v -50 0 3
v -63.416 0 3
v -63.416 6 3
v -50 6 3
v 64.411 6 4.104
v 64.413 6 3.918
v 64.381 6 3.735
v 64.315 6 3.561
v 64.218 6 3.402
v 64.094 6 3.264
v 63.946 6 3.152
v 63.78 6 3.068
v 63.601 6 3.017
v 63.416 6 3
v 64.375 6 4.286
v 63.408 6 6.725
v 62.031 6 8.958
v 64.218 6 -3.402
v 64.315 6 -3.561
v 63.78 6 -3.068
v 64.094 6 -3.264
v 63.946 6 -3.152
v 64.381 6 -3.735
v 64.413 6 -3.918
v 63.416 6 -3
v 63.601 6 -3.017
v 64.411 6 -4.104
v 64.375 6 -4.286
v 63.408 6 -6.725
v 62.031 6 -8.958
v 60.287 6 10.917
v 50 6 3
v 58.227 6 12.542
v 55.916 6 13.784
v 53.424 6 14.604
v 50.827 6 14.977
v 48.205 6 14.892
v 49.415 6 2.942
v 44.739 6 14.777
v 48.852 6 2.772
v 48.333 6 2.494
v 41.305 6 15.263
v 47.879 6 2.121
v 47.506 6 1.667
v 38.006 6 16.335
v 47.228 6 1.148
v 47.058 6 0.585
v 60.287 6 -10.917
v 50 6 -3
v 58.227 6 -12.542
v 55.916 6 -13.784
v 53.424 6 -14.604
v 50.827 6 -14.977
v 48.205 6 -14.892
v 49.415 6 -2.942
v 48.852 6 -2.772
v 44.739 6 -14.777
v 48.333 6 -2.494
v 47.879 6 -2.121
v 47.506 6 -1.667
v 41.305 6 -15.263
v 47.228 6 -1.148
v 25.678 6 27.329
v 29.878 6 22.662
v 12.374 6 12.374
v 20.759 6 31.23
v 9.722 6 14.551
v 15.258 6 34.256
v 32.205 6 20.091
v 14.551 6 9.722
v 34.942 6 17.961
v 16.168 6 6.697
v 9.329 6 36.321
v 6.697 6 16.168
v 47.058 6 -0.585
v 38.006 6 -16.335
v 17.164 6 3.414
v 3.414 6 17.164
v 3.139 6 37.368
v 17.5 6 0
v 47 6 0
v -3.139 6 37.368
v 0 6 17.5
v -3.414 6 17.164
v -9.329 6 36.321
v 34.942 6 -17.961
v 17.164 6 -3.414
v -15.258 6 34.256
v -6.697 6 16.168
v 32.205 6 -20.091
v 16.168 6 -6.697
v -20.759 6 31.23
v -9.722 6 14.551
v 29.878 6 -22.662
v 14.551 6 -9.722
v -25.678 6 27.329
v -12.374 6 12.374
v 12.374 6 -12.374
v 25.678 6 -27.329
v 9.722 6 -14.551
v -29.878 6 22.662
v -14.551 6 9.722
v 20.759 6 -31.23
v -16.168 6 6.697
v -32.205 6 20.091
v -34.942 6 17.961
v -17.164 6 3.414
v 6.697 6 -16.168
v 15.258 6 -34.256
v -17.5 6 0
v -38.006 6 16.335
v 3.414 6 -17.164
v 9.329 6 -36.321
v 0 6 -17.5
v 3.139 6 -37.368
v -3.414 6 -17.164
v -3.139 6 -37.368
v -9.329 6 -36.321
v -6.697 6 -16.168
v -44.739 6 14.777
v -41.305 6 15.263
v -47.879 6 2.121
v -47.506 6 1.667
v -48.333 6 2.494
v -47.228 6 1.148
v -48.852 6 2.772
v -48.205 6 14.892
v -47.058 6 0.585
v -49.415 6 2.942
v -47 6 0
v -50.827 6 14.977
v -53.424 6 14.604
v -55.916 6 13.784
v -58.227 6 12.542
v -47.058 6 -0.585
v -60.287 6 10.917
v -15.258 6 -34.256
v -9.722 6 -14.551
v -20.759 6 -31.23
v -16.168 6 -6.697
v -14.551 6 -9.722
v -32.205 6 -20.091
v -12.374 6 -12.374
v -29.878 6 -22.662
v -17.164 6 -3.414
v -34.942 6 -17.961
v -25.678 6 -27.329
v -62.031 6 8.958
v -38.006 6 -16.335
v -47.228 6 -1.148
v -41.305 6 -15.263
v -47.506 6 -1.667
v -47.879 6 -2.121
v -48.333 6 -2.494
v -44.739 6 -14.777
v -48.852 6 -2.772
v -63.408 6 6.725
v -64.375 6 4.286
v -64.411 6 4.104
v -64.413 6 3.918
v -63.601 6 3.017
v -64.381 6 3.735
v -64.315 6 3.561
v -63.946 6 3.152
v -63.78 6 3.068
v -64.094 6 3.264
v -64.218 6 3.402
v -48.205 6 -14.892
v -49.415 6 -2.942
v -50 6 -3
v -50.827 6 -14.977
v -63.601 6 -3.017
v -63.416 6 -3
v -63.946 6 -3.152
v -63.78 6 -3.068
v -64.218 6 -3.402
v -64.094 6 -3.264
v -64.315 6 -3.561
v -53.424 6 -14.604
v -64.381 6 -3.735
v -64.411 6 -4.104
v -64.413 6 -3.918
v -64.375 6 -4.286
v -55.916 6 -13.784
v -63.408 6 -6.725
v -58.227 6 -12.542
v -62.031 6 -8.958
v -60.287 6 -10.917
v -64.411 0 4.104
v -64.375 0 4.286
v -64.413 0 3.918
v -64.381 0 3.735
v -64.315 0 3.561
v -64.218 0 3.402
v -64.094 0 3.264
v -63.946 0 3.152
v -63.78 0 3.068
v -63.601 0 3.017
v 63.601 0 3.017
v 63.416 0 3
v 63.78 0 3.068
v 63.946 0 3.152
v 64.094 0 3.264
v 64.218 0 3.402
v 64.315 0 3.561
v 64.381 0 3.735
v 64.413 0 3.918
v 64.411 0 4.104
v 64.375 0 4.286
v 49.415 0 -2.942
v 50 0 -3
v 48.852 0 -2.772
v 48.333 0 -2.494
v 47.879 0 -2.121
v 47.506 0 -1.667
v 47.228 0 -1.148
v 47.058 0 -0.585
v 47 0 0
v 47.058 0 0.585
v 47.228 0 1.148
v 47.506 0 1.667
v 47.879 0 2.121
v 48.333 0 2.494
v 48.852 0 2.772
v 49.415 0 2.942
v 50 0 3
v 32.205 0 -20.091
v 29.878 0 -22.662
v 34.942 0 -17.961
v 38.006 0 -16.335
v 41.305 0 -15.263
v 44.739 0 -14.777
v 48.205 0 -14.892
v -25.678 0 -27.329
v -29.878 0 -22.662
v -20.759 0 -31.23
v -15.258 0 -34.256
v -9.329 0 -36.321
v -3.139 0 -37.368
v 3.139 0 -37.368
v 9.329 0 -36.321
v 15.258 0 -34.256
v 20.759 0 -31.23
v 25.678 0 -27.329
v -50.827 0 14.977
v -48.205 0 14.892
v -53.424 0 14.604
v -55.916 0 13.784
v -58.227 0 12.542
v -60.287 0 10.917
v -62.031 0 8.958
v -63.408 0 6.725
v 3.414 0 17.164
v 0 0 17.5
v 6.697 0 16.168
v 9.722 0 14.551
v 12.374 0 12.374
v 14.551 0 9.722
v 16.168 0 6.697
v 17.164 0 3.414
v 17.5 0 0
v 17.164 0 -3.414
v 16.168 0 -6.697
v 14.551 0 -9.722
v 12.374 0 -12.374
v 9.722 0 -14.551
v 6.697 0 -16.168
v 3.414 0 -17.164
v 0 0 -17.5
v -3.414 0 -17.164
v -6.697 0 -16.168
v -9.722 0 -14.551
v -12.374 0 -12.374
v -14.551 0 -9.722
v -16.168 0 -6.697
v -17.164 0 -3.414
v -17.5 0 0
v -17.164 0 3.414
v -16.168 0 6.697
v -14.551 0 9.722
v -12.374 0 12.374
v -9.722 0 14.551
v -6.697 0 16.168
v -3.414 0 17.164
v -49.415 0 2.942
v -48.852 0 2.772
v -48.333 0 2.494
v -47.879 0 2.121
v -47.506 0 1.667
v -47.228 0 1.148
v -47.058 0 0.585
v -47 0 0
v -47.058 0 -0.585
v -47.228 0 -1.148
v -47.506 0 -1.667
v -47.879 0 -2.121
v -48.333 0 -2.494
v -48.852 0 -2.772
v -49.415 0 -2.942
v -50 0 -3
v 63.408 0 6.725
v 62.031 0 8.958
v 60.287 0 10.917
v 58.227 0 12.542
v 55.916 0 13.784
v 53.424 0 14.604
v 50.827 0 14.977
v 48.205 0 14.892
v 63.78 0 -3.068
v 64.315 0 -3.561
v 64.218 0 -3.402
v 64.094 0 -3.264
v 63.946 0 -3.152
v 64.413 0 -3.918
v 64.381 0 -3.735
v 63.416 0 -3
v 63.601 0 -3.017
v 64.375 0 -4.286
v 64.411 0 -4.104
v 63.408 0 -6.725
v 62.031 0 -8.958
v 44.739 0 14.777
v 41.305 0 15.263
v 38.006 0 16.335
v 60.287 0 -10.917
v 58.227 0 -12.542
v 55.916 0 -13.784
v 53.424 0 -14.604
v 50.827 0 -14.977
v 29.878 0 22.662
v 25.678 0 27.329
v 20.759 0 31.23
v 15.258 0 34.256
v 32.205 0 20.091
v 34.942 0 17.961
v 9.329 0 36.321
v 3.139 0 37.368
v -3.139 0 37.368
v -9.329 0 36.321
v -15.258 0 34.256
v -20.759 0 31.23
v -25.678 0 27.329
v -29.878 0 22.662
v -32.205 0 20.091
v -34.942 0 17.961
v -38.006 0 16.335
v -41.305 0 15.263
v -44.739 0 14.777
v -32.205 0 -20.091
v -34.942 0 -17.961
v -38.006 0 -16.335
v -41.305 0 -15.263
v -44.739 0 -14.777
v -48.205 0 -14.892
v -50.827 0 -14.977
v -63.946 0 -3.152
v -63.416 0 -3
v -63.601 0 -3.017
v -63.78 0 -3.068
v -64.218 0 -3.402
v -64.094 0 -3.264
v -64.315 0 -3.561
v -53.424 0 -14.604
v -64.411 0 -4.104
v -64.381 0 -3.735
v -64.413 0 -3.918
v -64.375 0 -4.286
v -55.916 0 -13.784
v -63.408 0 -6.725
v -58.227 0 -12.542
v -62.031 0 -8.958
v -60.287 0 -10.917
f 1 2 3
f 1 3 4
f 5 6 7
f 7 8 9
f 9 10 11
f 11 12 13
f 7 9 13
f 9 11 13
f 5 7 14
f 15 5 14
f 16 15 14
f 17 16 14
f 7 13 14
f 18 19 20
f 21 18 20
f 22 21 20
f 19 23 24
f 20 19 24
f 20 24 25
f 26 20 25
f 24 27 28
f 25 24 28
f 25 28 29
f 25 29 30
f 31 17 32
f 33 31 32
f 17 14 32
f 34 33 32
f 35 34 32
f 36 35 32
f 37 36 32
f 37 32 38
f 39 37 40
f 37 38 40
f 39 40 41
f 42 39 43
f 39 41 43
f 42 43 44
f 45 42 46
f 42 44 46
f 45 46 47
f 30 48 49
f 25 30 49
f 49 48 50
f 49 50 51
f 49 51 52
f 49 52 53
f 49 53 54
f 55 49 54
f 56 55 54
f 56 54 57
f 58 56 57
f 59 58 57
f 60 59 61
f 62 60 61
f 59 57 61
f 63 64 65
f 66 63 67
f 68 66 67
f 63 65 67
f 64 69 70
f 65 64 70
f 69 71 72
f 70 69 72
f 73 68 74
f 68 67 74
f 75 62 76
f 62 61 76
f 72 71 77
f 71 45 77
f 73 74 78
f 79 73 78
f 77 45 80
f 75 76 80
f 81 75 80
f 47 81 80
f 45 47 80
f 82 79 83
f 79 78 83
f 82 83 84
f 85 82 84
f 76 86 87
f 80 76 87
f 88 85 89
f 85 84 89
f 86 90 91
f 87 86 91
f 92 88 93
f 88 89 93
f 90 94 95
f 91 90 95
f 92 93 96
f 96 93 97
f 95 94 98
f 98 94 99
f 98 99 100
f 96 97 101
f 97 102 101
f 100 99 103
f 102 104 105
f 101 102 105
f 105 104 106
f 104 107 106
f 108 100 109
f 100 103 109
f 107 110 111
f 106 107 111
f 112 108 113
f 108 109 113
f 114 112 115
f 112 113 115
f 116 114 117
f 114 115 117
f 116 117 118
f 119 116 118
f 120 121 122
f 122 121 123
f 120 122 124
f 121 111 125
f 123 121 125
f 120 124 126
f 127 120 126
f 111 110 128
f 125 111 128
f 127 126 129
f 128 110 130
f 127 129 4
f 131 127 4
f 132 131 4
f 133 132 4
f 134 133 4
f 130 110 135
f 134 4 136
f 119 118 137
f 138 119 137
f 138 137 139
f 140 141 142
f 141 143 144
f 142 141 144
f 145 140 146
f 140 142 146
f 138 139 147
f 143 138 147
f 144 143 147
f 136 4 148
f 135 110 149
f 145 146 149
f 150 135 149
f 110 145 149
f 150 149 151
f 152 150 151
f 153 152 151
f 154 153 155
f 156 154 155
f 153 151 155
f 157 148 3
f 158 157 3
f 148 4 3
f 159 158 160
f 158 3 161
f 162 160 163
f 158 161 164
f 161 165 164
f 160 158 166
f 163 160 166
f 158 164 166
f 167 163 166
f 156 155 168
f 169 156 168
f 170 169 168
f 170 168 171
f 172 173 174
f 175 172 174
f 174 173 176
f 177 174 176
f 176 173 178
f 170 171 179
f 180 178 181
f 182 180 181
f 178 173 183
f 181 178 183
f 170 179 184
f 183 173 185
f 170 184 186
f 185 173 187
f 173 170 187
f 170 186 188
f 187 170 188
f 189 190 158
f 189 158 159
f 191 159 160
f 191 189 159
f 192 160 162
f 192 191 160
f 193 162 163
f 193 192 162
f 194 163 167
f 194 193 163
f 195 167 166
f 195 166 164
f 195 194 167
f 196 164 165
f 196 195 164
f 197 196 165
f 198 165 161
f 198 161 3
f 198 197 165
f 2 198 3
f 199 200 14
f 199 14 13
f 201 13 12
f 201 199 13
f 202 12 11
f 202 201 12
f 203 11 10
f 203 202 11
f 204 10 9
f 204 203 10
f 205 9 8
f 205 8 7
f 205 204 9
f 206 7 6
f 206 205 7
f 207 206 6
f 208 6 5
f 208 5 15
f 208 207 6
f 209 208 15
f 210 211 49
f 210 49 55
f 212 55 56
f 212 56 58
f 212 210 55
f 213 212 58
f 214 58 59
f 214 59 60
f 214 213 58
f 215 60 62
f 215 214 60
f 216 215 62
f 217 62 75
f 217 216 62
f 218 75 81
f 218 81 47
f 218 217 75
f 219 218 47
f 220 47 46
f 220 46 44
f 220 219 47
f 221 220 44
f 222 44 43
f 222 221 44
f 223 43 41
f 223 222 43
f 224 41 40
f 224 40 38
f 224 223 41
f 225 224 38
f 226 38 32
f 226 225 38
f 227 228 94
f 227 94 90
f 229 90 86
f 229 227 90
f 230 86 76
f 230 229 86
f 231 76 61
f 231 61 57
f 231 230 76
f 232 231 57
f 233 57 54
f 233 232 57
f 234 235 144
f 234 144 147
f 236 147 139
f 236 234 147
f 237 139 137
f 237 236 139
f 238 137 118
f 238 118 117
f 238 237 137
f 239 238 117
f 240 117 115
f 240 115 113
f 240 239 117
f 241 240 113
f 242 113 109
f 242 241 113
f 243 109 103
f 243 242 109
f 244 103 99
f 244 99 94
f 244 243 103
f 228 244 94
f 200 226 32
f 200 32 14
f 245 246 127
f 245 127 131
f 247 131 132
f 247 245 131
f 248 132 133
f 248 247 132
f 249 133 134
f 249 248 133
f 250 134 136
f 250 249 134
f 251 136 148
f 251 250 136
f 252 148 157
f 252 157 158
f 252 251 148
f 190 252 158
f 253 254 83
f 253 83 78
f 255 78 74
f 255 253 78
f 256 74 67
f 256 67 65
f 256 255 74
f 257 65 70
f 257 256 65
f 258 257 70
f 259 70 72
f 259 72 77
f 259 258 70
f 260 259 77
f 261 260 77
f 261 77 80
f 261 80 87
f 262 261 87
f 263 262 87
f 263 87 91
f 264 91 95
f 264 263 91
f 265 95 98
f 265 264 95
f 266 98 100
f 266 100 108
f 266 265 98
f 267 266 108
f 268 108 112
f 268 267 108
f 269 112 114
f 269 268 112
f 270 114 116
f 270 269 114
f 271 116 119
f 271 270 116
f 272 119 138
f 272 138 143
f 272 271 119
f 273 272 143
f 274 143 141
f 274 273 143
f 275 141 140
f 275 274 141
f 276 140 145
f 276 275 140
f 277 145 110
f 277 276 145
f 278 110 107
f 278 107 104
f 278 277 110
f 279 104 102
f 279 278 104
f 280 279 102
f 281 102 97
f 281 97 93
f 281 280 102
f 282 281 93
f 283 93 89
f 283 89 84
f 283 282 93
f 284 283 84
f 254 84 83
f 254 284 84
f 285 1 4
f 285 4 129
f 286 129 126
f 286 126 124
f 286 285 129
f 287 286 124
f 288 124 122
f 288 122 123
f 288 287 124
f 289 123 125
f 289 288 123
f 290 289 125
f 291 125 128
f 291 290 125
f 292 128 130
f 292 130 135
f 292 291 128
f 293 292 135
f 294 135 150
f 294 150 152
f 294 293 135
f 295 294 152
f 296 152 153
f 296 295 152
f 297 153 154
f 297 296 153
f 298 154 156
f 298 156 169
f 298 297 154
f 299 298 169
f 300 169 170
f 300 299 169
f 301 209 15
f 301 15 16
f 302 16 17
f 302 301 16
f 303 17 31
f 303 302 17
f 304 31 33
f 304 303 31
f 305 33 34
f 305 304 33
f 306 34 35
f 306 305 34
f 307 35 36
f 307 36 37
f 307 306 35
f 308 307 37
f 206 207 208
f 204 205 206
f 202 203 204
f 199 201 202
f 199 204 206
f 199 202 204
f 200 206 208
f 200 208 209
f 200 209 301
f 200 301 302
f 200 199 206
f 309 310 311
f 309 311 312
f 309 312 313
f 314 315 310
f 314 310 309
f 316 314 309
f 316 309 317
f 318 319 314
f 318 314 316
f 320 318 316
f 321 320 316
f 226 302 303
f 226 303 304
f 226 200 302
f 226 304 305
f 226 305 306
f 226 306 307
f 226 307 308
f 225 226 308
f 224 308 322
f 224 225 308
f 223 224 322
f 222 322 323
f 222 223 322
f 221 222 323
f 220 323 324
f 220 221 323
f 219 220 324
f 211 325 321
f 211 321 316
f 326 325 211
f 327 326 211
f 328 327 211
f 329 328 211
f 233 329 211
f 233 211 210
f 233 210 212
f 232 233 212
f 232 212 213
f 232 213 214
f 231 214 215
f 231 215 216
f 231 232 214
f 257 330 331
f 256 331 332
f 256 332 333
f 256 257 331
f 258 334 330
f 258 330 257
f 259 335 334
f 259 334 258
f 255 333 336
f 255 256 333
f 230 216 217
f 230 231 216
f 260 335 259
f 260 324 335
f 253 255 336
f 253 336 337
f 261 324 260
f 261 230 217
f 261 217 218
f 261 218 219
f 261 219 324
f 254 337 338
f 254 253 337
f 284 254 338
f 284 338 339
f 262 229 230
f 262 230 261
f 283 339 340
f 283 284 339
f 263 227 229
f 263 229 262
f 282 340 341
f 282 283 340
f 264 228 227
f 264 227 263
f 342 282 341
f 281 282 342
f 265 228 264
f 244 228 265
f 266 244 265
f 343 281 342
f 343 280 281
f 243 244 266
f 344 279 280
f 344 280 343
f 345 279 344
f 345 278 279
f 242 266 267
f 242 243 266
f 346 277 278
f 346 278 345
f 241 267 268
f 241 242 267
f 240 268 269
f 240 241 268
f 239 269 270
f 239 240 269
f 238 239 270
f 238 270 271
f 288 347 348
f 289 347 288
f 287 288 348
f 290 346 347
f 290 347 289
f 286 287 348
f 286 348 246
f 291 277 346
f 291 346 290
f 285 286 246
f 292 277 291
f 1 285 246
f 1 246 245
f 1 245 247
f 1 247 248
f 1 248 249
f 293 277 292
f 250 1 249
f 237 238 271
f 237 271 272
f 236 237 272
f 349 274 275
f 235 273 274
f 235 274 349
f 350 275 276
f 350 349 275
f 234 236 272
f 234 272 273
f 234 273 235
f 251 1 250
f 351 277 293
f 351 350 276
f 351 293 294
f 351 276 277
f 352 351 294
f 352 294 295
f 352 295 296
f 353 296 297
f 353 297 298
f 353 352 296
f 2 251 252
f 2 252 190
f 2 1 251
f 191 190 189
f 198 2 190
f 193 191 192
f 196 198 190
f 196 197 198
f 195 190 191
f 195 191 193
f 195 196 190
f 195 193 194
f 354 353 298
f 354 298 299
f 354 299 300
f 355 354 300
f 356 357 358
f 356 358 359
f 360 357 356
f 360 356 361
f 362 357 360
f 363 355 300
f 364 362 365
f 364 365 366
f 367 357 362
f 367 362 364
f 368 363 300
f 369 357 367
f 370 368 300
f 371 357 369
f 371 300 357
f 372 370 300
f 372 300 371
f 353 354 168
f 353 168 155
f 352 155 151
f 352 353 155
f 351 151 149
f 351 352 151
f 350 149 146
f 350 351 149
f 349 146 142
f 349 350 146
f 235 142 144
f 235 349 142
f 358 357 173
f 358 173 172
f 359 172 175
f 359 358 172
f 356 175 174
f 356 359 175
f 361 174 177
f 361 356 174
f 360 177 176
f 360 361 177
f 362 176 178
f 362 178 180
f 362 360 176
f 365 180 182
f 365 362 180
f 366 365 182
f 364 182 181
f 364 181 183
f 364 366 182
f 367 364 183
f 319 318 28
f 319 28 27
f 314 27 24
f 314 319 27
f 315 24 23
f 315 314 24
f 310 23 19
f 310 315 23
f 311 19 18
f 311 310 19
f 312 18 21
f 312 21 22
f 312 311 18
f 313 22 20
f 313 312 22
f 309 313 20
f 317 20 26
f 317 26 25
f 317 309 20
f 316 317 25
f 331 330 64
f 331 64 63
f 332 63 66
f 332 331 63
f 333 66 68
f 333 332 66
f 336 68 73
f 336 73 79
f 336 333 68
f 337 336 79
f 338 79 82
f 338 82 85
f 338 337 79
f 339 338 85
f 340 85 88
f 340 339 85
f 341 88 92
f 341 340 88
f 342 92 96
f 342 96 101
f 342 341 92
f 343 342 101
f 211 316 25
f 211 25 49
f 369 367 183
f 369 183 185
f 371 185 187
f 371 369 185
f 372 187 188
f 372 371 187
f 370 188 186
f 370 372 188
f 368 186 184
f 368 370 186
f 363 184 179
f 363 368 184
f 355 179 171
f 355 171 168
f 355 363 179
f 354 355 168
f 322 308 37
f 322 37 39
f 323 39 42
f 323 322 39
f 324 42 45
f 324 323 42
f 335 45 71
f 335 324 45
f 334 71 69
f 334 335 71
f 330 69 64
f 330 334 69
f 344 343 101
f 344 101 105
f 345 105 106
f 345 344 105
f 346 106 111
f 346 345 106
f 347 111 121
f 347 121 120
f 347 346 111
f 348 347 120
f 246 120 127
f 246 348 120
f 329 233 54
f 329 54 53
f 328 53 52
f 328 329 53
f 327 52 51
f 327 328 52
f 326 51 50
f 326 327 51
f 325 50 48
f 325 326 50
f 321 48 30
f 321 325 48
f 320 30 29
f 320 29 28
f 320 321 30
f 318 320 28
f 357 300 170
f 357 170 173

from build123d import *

# Parameters (mm, degrees)
SKETCH1_R           = 17.5
BOSS_EXTRUDE1_DEPTH = 6


with BuildPart() as part:
    # Sketch1 → Boss-Extrude1 (new body)
    with BuildSketch(Plane(origin=(0, 0, 0), x_dir=(1, 0, 0), z_dir=(0, 1, 0))):
        with BuildLine():
            Line((50, -3), (63.416407865, -3))
            ThreePointArc((63.416407865, -3), (64.218191591, -3.402385695), (64.374722712, -4.285714286))
            ThreePointArc((64.374722712, -4.285714286), (58.227349417, -12.542357098), (48.205357143, -14.892254934))
            ThreePointArc((48.205357143, -14.892254934), (38.006177908, -16.334976641), (29.877717391, -22.662127073))
            ThreePointArc((29.877717391, -22.662127073), (0, -37.5), (-29.877717391, -22.662127073))
            ThreePointArc((-29.877717391, -22.662127073), (-38.006177908, -16.334976641), (-48.205357143, -14.892254934))
            ThreePointArc((-48.205357143, -14.892254934), (-58.227349417, -12.542357098), (-64.374722712, -4.285714286))
            ThreePointArc((-64.374722712, -4.285714286), (-64.218191591, -3.402385695), (-63.416407865, -3))
            Line((-63.416407865, -3), (-50, -3))
            ThreePointArc((-50, -3), (-47, 0), (-50, 3))
            Line((-50, 3), (-63.416407865, 3))
            ThreePointArc((-63.416407865, 3), (-64.218191591, 3.402385695), (-64.374722712, 4.285714286))
            ThreePointArc((-64.374722712, 4.285714286), (-58.227349417, 12.542357098), (-48.205357143, 14.892254934))
            ThreePointArc((-48.205357143, 14.892254934), (-38.006177908, 16.334976641), (-29.877717391, 22.662127073))
            ThreePointArc((-29.877717391, 22.662127073), (0, 37.5), (29.877717391, 22.662127073))
            ThreePointArc((29.877717391, 22.662127073), (38.006177908, 16.334976641), (48.205357143, 14.892254934))
            ThreePointArc((48.205357143, 14.892254934), (58.227349417, 12.542357098), (64.374722712, 4.285714286))
            ThreePointArc((64.374722712, 4.285714286), (64.218191591, 3.402385695), (63.416407865, 3))
            Line((63.416407865, 3), (50, 3))
            ThreePointArc((50, 3), (47, 0), (50, -3))
        make_face()
        with Locations(Location((0, 0, 0), (0, 0, 270))):
            Circle(SKETCH1_R, mode=Mode.SUBTRACT)
    extrude(amount=BOSS_EXTRUDE1_DEPTH)


solid = part.part
